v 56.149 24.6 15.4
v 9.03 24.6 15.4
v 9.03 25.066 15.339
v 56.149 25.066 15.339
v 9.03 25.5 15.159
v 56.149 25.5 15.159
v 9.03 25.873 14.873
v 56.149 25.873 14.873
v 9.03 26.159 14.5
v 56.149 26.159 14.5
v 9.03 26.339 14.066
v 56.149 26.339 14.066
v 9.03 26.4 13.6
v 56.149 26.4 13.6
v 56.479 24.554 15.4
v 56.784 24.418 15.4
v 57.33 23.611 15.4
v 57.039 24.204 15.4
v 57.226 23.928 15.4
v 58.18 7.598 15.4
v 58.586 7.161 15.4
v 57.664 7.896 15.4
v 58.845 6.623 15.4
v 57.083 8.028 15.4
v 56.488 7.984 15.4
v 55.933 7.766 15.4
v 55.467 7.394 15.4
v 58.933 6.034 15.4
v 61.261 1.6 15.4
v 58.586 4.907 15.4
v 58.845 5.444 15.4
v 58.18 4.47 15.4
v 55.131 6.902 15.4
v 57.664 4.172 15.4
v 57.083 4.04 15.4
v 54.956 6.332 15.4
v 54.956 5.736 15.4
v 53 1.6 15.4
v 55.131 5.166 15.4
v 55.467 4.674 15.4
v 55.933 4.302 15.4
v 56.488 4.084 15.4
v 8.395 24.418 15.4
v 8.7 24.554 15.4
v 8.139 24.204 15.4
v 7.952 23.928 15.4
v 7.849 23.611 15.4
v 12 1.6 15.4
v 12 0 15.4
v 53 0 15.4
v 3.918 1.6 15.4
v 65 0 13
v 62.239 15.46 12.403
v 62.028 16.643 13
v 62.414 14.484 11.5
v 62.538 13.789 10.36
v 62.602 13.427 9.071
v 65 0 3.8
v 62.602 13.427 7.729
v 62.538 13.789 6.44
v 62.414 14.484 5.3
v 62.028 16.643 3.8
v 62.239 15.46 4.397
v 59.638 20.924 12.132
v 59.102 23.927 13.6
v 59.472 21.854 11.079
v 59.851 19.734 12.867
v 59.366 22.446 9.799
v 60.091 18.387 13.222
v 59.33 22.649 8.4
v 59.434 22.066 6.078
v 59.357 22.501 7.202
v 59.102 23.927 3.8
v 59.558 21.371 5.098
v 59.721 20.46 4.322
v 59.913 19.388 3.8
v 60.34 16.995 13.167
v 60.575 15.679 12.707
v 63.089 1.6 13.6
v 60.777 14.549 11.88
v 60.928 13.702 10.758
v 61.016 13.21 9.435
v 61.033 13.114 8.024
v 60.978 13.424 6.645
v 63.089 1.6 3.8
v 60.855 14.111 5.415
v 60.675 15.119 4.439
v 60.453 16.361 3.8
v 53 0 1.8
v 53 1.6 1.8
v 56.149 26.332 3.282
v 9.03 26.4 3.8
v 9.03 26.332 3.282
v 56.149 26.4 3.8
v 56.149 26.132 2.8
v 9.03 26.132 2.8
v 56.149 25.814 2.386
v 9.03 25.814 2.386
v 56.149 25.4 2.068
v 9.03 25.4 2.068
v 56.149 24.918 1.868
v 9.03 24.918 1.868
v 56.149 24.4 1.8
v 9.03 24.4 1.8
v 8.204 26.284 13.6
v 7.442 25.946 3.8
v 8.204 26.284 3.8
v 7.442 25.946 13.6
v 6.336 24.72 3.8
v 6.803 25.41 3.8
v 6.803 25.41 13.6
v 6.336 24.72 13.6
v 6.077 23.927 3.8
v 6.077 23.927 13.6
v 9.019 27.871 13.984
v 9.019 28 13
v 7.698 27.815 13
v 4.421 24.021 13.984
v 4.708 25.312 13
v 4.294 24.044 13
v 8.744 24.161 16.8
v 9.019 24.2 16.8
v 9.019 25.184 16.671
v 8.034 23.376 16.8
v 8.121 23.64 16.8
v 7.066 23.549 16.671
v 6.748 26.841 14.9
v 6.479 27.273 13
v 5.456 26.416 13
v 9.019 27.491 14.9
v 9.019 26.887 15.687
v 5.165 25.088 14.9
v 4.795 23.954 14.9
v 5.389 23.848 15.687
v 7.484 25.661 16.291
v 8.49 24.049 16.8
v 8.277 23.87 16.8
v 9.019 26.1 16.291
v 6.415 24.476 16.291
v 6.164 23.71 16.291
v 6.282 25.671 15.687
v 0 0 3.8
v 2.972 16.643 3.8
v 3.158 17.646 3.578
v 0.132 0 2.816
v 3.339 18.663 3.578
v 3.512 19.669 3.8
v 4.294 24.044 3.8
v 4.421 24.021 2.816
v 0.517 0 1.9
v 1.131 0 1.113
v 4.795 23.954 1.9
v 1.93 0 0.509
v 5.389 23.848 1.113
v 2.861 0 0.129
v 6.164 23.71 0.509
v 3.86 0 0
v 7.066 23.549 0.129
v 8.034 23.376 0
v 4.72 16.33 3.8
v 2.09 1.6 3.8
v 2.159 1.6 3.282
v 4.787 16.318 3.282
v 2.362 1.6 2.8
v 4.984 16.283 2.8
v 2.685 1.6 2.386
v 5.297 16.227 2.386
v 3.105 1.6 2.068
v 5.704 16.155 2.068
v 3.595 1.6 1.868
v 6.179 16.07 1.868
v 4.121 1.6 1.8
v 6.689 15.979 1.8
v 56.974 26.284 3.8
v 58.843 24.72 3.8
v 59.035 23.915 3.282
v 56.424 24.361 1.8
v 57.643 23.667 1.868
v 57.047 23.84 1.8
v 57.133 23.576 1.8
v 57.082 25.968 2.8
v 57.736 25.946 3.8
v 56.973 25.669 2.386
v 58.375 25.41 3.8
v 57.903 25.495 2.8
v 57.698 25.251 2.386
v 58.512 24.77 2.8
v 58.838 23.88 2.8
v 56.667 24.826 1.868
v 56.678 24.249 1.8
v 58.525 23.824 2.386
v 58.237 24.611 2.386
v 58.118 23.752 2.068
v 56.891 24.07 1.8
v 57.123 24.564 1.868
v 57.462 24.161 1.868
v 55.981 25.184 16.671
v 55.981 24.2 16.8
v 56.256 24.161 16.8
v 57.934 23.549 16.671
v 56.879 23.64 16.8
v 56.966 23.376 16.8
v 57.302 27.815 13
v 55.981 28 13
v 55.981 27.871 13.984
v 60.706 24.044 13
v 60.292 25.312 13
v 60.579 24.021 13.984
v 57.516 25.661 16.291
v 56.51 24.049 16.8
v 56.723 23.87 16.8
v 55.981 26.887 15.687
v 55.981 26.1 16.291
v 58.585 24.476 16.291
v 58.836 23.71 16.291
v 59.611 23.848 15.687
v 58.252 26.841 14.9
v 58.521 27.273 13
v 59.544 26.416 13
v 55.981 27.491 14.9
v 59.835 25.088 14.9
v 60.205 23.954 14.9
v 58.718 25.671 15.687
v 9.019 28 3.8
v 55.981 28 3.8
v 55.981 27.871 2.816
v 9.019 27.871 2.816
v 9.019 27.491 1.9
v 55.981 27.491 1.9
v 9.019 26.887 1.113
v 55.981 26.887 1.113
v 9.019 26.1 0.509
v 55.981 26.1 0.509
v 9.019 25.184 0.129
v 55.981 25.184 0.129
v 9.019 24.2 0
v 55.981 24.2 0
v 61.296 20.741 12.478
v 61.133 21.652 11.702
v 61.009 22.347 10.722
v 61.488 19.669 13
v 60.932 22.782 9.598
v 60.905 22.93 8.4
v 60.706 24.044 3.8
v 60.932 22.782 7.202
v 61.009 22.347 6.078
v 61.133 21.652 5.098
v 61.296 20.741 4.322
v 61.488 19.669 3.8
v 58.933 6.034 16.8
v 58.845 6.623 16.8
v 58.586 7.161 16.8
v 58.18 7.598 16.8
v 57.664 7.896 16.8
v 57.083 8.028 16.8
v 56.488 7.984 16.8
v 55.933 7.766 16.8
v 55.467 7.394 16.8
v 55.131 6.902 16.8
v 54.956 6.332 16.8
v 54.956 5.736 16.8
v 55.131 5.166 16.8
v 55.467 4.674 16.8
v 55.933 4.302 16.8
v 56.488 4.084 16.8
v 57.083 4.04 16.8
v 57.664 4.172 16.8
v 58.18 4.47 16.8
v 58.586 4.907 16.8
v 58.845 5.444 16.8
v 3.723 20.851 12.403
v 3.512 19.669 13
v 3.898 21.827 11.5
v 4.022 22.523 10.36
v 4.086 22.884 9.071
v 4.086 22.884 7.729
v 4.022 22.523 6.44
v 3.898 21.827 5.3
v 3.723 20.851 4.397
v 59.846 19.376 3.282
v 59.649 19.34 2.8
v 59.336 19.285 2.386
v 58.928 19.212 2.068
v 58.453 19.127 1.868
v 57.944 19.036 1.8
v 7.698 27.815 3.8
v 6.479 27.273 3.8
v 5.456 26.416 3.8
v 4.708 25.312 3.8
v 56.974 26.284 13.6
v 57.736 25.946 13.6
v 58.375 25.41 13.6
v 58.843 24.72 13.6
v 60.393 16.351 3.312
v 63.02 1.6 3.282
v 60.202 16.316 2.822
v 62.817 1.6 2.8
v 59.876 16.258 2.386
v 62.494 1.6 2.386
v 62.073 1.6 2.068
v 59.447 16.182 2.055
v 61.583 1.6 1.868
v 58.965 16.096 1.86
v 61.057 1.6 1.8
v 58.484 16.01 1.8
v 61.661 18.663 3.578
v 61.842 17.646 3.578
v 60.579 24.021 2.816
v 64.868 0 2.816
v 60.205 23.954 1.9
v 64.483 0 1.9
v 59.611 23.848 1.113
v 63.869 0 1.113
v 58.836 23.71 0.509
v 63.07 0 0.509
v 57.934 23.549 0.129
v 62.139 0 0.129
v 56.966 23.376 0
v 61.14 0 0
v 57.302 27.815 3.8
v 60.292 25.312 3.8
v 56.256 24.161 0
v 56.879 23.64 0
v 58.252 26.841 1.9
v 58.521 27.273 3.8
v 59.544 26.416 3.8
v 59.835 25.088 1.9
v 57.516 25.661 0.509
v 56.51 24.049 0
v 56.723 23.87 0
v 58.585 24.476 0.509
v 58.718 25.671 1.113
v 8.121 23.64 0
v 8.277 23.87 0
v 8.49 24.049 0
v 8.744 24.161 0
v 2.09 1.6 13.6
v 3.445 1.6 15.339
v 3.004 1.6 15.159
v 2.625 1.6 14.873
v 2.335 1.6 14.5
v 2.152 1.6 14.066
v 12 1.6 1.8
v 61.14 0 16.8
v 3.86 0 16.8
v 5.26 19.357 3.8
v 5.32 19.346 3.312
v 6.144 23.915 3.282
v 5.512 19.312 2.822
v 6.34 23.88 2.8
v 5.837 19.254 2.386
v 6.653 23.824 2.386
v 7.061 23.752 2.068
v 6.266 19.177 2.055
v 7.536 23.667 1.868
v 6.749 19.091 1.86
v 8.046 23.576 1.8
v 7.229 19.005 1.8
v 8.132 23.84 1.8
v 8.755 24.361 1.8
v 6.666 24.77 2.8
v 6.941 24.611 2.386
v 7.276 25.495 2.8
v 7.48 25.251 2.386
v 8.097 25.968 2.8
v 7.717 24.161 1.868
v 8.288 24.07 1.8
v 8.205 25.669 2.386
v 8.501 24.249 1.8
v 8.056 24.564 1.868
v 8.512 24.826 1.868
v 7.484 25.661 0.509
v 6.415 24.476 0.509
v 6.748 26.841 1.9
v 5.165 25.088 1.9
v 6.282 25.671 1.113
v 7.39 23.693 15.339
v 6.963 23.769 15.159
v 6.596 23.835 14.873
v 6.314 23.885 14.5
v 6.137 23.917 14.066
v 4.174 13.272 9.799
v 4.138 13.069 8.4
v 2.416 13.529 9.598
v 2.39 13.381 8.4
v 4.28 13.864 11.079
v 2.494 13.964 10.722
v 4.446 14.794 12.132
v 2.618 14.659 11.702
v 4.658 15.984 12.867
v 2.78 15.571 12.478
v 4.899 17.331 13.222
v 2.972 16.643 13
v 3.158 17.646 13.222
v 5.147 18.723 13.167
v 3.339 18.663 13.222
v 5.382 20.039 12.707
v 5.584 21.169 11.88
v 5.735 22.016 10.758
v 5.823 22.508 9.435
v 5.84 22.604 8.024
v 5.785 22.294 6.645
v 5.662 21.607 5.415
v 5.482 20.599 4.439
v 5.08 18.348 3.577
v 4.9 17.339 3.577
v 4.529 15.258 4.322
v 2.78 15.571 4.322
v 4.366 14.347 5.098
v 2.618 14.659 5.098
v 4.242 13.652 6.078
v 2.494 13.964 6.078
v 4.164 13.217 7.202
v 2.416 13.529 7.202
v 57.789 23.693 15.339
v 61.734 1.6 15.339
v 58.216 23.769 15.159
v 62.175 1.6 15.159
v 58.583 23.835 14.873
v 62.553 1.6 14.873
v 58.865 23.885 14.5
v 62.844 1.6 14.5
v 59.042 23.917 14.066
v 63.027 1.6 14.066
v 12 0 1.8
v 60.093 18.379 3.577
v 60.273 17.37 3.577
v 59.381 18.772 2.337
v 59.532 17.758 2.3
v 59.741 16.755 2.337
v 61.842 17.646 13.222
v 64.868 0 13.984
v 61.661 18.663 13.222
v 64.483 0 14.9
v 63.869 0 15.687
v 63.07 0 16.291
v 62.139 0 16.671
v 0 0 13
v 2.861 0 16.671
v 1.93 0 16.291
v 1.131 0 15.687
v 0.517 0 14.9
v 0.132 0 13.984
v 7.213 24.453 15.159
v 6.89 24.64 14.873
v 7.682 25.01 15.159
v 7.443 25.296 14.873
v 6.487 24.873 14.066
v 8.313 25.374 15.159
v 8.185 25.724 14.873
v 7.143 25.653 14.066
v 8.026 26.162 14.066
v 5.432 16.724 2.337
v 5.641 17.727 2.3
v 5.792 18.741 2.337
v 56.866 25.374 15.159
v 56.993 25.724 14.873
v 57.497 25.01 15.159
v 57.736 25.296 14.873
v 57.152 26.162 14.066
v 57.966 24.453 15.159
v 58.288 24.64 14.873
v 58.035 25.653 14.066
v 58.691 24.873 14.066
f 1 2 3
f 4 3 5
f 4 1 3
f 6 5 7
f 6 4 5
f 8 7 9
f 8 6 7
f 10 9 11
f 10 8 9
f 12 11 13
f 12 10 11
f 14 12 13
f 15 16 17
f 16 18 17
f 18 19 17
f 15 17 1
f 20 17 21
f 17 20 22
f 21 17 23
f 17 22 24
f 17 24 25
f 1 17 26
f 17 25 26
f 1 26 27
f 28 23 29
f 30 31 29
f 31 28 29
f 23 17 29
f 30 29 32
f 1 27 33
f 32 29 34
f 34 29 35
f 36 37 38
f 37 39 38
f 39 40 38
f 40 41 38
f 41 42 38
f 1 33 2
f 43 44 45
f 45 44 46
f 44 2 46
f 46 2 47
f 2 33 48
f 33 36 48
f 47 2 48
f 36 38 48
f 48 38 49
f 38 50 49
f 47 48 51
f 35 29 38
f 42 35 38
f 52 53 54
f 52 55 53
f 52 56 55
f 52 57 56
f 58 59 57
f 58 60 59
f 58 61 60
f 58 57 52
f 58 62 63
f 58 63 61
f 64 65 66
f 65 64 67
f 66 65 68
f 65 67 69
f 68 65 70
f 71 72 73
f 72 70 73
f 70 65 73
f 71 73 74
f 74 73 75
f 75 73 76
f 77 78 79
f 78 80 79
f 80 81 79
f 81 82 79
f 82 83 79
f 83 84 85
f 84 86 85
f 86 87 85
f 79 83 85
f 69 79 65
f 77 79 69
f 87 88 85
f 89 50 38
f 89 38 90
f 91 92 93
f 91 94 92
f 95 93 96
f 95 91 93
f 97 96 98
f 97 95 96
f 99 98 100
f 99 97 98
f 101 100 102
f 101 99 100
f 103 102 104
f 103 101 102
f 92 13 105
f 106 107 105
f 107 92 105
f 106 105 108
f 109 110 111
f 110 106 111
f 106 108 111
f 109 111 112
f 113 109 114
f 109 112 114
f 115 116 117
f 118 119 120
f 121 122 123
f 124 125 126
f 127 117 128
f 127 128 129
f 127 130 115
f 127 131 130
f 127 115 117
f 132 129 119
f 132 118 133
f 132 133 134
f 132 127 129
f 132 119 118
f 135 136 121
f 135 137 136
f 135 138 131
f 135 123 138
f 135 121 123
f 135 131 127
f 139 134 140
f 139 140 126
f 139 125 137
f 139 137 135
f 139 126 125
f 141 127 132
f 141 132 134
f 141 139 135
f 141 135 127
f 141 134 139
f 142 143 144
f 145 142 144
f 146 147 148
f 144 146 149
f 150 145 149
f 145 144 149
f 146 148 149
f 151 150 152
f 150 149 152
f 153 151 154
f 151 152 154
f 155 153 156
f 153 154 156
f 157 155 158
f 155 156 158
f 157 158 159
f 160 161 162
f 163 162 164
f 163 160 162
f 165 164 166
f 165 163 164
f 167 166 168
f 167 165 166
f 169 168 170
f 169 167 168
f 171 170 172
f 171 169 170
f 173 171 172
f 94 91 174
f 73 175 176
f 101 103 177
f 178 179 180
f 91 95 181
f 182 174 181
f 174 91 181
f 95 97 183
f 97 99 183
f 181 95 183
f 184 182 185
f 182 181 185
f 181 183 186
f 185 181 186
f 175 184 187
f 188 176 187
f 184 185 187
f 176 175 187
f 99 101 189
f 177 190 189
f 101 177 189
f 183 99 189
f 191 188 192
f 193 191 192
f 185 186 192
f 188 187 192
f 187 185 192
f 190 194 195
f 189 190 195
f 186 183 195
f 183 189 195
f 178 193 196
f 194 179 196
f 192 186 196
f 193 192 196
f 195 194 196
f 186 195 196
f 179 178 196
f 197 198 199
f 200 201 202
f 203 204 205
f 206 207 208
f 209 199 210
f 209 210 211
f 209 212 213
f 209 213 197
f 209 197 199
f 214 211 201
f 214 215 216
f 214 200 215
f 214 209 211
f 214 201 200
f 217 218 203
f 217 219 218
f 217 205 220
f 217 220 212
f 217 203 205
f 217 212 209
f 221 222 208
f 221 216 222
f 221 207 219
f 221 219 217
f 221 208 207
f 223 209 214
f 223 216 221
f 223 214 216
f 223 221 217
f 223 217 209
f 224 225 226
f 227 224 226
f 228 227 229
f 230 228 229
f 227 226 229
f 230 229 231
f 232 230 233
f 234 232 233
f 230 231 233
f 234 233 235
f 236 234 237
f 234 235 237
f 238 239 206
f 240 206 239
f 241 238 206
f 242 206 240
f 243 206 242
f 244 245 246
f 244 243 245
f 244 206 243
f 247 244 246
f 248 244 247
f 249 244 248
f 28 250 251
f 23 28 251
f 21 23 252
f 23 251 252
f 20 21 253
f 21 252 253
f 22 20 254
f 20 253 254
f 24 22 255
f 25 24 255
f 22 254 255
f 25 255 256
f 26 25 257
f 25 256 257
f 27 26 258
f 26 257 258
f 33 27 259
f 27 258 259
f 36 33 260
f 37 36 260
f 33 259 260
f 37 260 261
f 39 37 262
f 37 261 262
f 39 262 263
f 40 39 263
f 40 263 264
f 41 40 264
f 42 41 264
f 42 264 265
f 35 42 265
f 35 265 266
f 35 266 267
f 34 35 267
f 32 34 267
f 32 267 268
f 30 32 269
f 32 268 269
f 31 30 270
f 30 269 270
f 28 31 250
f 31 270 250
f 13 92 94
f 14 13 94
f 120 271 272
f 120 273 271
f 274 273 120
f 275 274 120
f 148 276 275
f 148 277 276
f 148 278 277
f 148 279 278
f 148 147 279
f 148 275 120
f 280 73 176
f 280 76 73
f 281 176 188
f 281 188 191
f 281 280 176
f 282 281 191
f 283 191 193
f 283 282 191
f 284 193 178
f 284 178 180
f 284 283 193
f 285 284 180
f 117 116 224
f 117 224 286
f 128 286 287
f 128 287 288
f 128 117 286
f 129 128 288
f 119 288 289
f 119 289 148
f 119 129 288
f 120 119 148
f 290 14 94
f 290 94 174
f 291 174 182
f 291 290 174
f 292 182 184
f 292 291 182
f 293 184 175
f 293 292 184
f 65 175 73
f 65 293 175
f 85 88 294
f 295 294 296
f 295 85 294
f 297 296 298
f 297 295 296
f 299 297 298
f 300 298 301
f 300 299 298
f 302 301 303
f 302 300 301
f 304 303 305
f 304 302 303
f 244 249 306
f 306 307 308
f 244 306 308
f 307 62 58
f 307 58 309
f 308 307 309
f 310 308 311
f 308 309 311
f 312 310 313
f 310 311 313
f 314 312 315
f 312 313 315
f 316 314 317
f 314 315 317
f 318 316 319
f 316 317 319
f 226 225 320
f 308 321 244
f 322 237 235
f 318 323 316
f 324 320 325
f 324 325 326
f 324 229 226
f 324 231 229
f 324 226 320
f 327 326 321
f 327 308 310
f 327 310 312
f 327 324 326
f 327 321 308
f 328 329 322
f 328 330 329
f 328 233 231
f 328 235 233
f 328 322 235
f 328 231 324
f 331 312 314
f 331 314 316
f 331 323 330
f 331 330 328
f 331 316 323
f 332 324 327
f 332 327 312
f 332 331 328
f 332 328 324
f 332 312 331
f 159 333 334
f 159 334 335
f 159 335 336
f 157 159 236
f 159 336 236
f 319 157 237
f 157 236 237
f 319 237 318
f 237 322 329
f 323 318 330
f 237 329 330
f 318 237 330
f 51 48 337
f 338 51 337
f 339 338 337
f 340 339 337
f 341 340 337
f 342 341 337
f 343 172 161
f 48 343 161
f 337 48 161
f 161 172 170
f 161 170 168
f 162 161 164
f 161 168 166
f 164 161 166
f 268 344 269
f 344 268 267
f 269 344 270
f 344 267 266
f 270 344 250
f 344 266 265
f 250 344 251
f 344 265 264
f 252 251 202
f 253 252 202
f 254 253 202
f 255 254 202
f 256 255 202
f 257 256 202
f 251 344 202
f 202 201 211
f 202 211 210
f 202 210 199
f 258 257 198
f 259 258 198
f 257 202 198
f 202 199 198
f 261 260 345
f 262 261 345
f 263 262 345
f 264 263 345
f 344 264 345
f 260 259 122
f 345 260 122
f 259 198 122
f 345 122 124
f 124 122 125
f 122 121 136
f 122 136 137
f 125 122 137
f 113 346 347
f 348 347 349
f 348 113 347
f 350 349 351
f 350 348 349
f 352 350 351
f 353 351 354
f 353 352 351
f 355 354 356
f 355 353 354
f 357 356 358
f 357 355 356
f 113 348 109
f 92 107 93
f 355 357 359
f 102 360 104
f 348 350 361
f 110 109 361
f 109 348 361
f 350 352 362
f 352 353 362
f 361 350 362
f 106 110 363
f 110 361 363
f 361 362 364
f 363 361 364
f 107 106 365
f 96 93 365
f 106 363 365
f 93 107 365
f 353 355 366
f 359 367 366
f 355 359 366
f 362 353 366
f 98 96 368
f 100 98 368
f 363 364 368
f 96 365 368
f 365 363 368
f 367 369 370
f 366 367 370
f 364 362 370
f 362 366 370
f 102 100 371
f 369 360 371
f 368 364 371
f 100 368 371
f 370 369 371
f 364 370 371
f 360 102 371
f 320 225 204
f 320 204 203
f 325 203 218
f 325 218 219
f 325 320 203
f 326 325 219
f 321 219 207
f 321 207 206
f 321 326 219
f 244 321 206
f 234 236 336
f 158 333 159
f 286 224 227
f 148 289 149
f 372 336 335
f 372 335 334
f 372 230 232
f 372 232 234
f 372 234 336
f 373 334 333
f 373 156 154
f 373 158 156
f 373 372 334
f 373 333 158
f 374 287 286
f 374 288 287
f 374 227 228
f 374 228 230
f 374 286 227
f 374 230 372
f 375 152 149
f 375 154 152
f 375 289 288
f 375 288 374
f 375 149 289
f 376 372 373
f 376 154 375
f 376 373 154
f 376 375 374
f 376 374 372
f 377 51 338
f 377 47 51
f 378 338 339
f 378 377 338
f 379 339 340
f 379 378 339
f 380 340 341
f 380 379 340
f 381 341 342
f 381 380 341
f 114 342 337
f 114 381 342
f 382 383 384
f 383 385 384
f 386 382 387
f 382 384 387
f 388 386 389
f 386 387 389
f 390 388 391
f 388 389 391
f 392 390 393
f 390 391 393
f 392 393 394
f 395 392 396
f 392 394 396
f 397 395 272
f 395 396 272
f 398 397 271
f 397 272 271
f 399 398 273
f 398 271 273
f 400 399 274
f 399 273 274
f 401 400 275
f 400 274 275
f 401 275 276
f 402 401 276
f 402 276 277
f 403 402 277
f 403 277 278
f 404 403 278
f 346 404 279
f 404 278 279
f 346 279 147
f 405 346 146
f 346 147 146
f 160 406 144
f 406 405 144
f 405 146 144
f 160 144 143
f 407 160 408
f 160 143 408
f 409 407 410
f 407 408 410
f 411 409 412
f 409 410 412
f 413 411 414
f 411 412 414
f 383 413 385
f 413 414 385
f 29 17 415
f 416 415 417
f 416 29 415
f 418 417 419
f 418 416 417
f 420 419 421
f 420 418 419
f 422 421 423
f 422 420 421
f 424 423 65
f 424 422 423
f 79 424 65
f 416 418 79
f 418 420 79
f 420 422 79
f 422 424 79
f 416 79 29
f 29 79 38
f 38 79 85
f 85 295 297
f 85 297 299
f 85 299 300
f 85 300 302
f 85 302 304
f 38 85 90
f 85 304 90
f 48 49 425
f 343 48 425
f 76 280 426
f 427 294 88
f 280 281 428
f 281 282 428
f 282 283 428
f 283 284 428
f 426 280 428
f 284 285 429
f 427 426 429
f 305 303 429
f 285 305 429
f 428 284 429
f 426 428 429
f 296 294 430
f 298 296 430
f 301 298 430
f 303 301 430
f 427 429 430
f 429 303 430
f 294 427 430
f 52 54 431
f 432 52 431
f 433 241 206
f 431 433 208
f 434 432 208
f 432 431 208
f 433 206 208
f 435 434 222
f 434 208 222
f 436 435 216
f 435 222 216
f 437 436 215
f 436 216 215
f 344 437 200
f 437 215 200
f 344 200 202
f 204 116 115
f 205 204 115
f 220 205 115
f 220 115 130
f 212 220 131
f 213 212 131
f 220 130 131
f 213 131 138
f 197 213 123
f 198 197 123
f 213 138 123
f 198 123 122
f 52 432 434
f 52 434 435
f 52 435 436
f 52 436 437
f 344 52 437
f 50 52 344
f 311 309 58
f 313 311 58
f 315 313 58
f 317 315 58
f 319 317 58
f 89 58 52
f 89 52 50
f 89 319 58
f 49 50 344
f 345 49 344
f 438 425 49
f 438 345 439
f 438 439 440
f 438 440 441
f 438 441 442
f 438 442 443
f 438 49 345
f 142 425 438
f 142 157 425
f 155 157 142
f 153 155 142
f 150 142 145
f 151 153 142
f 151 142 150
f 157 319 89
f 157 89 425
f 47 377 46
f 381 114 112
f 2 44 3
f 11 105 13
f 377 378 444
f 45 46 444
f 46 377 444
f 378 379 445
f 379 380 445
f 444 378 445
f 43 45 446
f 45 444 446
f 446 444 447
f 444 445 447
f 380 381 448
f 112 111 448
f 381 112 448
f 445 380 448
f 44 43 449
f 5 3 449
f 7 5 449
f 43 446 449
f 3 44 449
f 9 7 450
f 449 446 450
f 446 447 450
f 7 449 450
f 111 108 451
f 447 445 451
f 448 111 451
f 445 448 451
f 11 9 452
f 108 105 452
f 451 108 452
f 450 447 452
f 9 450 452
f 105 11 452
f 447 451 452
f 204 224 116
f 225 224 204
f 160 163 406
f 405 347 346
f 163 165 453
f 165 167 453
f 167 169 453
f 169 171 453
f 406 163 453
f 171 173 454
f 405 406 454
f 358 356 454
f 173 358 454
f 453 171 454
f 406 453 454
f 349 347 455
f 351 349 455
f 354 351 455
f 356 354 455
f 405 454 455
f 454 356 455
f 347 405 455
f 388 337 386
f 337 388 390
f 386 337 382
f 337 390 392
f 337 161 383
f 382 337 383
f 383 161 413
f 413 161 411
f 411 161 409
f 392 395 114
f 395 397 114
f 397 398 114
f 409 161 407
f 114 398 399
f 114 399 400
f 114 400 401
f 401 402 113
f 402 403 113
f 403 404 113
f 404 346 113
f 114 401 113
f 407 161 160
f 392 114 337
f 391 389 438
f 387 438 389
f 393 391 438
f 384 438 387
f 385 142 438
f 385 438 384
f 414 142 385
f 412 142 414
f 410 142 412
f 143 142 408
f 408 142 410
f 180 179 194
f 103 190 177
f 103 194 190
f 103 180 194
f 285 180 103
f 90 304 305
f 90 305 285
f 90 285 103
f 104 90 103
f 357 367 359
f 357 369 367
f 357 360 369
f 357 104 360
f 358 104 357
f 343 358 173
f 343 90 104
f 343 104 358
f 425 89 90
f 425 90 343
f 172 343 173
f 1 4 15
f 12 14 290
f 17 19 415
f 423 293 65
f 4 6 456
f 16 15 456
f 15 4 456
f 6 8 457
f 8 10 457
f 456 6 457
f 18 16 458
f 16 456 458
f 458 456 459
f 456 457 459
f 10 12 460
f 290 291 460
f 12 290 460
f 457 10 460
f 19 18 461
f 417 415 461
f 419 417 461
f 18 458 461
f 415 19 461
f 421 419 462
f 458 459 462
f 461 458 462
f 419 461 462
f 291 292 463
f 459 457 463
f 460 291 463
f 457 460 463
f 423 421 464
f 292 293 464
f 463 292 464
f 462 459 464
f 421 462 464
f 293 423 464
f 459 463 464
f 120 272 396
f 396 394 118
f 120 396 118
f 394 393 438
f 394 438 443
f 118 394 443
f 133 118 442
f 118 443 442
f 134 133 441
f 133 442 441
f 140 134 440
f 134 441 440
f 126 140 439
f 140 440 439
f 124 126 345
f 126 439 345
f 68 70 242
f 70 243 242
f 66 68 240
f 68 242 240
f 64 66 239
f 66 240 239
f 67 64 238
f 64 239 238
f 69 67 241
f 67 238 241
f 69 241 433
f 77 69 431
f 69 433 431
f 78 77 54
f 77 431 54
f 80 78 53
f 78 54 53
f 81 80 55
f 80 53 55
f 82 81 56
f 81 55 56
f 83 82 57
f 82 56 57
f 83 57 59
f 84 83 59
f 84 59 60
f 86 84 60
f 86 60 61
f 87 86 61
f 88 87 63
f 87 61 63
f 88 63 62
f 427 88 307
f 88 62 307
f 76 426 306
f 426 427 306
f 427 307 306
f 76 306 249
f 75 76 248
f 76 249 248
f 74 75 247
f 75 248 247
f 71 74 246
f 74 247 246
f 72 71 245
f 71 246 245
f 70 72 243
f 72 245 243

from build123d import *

# Parameters (mm, degrees)
BOSS_EXTRUDE1_DEPTH = 1.8
BOSS_EXTRUDE2_DEPTH = 15
SKETCH3_R           = 4.85
CUT_EXTRUDE1_DEPTH  = 15
SKETCH4_R           = 4.85
CUT_EXTRUDE2_DEPTH  = 15
FILLET1_R           = 3
FILLET2_R           = 4.8
FILLET3_R           = 2
FILLET4_R           = 3.8
BOSS_EXTRUDE3_DEPTH = 1.4
SKETCH6_R           = 2
CUT_EXTRUDE3_DEPTH  = 1.4
BOSS_EXTRUDE4_DEPTH = 1.4
SKETCH8_W           = 41
SKETCH8_H           = 13.6
CUT_EXTRUDE4_DEPTH  = 4.4
FILLET5_R           = 1.8
FILLET6_R           = 3.8


with BuildPart() as part:
    # Sketch1 → Boss-Extrude1 (new body)
    with BuildSketch(Plane.XY):
        Polygon((0, 0), (65, 0), (60, 28), (5, 28), align=None)
    extrude(amount=BOSS_EXTRUDE1_DEPTH)

    # Sketch2 → Boss-Extrude2 (add)
    with BuildSketch(Plane.XY.offset(1.8)):
        Polygon((5, 28), (60, 28), (65, 0), (0, 0), align=None)
        Polygon((6.518195748, 26.4), (58.660404268, 26.4), (63.088975697, 1.6), (2.08962432, 1.6), align=None, mode=Mode.SUBTRACT)
    extrude(amount=BOSS_EXTRUDE2_DEPTH)

    # Sketch3 → Cut-Extrude1 (cut)
    with BuildSketch(Plane(origin=(62.991347342, 11.248454883, 0), x_dir=(0, 0, -1), z_dir=(0.9844275755084821, 0.17579063848365745, 0))):
        with Locations(Location((-8.4, 7.016533805, 0), (0, 0, 90))):
            Circle(SKETCH3_R)
    extrude(amount=-CUT_EXTRUDE1_DEPTH, mode=Mode.SUBTRACT)

    # Sketch4 → Cut-Extrude2 (cut)
    with BuildSketch(Plane(origin=(0, 0, 0), x_dir=(0, 0, 1), z_dir=(-0.9844275755084821, 0.17579063848365759, 0))):
        with Locations(Location((8.4, 18.442925307, 0), (0, 0, 270))):
            Circle(SKETCH4_R)
    extrude(amount=-CUT_EXTRUDE2_DEPTH, mode=Mode.SUBTRACT)

    # Fillet1
    fillet1_edges = [part.edges().sort_by_distance(p)[0] for p in [
        (58.660404268, 26.4, 9.3),
        (6.518195748, 26.4, 9.3),
    ]]
    fillet(fillet1_edges, radius=FILLET1_R)

    # Fillet2
    fillet2_edges = [part.edges().sort_by_distance(p)[0] for p in [
        (5, 28, 8.4),
        (60, 28, 8.4),
    ]]
    fillet(fillet2_edges, radius=FILLET2_R)

    # Fillet3
    fillet3_edges = [part.edges().sort_by_distance(p)[0] for p in [
        (61.095460347, 12.763685958, 1.8),
        (32.589300008, 26.4, 1.8),
        (4.083139669, 12.763685958, 1.8),
        (58.07452367, 25.700229961, 1.8),
        (7.104076347, 25.700229961, 1.8),
    ]]
    fillet(fillet3_edges, radius=FILLET3_R)

    # Fillet4
    # the kernel refuses this fillet: 3.8 mm, written as the material it takes off along each edge
    with BuildSketch(Plane(origin=(55.981212805, 28, 0), x_dir=(0, 0, 1), z_dir=(-1, 0, 0))) as fillet4_piece_1:
        with BuildLine():
            CenterArc((FILLET4_R, -FILLET4_R), FILLET4_R, 90, 90)
            Line((0, -FILLET4_R), (0, 0))
            Line((0, 0), (FILLET4_R, 0))
        make_face()
    extrude(amount=46.962425609, mode=Mode.SUBTRACT)
    with BuildSketch(Plane(origin=(66.670011066, -9.352061967, 0), x_dir=(0, 0, 1), z_dir=(-0.17579063848365728, 0.9844275755084821, 0)), Plane(origin=(4.293534833, 24.043795065, 0), x_dir=(0, 0, 1), z_dir=(-0.17579063848365753, -0.984427575508482, 0))) as fillet4_piece_2:
        with BuildLine():
            CenterArc((FILLET4_R, -FILLET4_R), FILLET4_R, 90, 90)
            Line((0, -FILLET4_R), (0, 0))
            Line((0, 0), (FILLET4_R, 0))
        make_face()
    extrude(amount=33.924138111, mode=Mode.SUBTRACT)
    with BuildSketch(Plane(origin=(9.018787195, 23.2, 0), x_dir=(0, 1, 0), z_dir=(1, 0, 0))) as fillet4_piece_3:
        with BuildLine():
            CenterArc((4.8 - FILLET4_R, FILLET4_R), FILLET4_R, 270, 90)
            Line((4.8 - FILLET4_R, 0), (4.8, 0))
            Line((4.8, 0), (4.8, FILLET4_R))
        make_face()
    revolve(axis=Axis((9.018787195, 23.2, 0), (0, 0, 1)), revolution_arc=79.875328345, mode=Mode.SUBTRACT)
    with BuildSketch(Plane(origin=(55.981212805, 23.2, 0), x_dir=(0, 1, 0), z_dir=(-1, 0, 0))) as fillet4_piece_4:
        with BuildLine():
            CenterArc((4.8 - FILLET4_R, -FILLET4_R), FILLET4_R, 0, 90)
            Line((4.8 - FILLET4_R, 0), (4.8, 0))
            Line((4.8, 0), (4.8, -FILLET4_R))
        make_face()
    revolve(axis=Axis((55.981212805, 23.2, 0), (0, 0, -1)), revolution_arc=79.875328345, mode=Mode.SUBTRACT)

    # Sketch5 → Boss-Extrude3 (add)
    with BuildSketch(Plane.XY.offset(16.8)):
        Polygon((2.08962432, 1.6), (62.853232584, 1.6), (63.866257319, 1.6), (62.171786683, 12.021897532), (3.201344626, 12.021897532), (1.273741814, 1.6), align=None)
    extrude(amount=-BOSS_EXTRUDE3_DEPTH)

    # Sketch6 → Cut-Extrude3 (cut)
    with BuildSketch(Plane.XY.offset(16.8)):
        with Locations((56.933372232, 6.033926522)):
            Circle(SKETCH6_R)
    extrude(amount=-CUT_EXTRUDE3_DEPTH, mode=Mode.SUBTRACT)

    # Sketch7 → Boss-Extrude4 (add)
    with BuildSketch(Plane.XY.offset(16.8)):
        Polygon((6.155527083, 26.711603316), (3.95067745, 17.333364545), (3.95067745, 12.021897532), (61.507859388, 12.021897532), (61.507859388, 17.333364545), (58.93189058, 26.711603316), align=None)
    extrude(amount=-BOSS_EXTRUDE4_DEPTH)

    # Sketch8 → Cut-Extrude4 (cut)
    with BuildSketch(Plane(origin=(0, 0, 0), x_dir=(-1, 0, 0), z_dir=(0, -1, 0))):
        with Locations((-32.5, -8.6)):
            Rectangle(SKETCH8_W, SKETCH8_H)
    extrude(amount=-CUT_EXTRUDE4_DEPTH, mode=Mode.SUBTRACT)

    # Fillet5
    fillet5_edges = [part.edges().sort_by_distance(p)[0] for p in [
        (61.095460347, 12.763685958, 15.4),
        (4.083139669, 12.763685958, 15.4),
        (58.07452367, 25.700229961, 15.4),
        (7.104076347, 25.700229961, 15.4),
        (32.589300008, 26.4, 15.4),
    ]]
    fillet(fillet5_edges, radius=FILLET5_R)

    # Fillet6
    # the kernel refuses this fillet: 3.8 mm, written as the material it takes off along each edge
    with BuildSketch(Plane(origin=(60.706465167, 24.043795065, 16.8), x_dir=(-0.984427575508482, -0.17579063848365725, 0), z_dir=(0.17579063848365728, -0.9844275755084821, 0))) as fillet6_piece_1:
        with BuildLine():
            CenterArc((FILLET6_R, FILLET6_R), FILLET6_R, 180, 90)
            Line((0, FILLET6_R), (0, 0))
            Line((0, 0), (FILLET6_R, 0))
        make_face()
    extrude(amount=33.924138111, mode=Mode.SUBTRACT)
    with BuildSketch(Plane(origin=(9.018787195, 28, 16.8), x_dir=(0, -1, 0), z_dir=(1, 0, 0))) as fillet6_piece_2:
        with BuildLine():
            CenterArc((FILLET6_R, FILLET6_R), FILLET6_R, 180, 90)
            Line((0, FILLET6_R), (0, 0))
            Line((0, 0), (FILLET6_R, 0))
        make_face()
    extrude(amount=46.962425609, mode=Mode.SUBTRACT)
    with BuildSketch(Plane(origin=(-1.670011066, -9.352061967, 16.8), x_dir=(0, 0, -1), z_dir=(0.17579063848365753, 0.984427575508482, 0))) as fillet6_piece_3:
        with BuildLine():
            CenterArc((FILLET6_R, -FILLET6_R), FILLET6_R, 90, 90)
            Line((0, -FILLET6_R), (0, 0))
            Line((0, 0), (FILLET6_R, 0))
        make_face()
    extrude(amount=33.924138111, mode=Mode.SUBTRACT)
    with BuildSketch(Plane(origin=(9.018787195, 23.2, 16.8), x_dir=(0, 1, 0), z_dir=(1, 0, 0))) as fillet6_piece_4:
        with BuildLine():
            CenterArc((4.8 - FILLET6_R, -FILLET6_R), FILLET6_R, 0, 90)
            Line((4.8 - FILLET6_R, 0), (4.8, 0))
            Line((4.8, 0), (4.8, -FILLET6_R))
        make_face()
    revolve(axis=Axis((9.018787195, 23.2, 16.8), (0, 0, 1)), revolution_arc=79.875328345, mode=Mode.SUBTRACT)
    with BuildSketch(Plane(origin=(55.981212805, 23.2, 16.8), x_dir=(0, 1, 0), z_dir=(-1, 0, 0))) as fillet6_piece_5:
        with BuildLine():
            CenterArc((4.8 - FILLET6_R, FILLET6_R), FILLET6_R, 270, 90)
            Line((4.8, FILLET6_R), (4.8, 0))
            Line((4.8, 0), (4.8 - FILLET6_R, 0))
        make_face()
    revolve(axis=Axis((55.981212805, 23.2, 16.8), (0, 0, -1)), revolution_arc=79.875328345, mode=Mode.SUBTRACT)


solid = part.part
